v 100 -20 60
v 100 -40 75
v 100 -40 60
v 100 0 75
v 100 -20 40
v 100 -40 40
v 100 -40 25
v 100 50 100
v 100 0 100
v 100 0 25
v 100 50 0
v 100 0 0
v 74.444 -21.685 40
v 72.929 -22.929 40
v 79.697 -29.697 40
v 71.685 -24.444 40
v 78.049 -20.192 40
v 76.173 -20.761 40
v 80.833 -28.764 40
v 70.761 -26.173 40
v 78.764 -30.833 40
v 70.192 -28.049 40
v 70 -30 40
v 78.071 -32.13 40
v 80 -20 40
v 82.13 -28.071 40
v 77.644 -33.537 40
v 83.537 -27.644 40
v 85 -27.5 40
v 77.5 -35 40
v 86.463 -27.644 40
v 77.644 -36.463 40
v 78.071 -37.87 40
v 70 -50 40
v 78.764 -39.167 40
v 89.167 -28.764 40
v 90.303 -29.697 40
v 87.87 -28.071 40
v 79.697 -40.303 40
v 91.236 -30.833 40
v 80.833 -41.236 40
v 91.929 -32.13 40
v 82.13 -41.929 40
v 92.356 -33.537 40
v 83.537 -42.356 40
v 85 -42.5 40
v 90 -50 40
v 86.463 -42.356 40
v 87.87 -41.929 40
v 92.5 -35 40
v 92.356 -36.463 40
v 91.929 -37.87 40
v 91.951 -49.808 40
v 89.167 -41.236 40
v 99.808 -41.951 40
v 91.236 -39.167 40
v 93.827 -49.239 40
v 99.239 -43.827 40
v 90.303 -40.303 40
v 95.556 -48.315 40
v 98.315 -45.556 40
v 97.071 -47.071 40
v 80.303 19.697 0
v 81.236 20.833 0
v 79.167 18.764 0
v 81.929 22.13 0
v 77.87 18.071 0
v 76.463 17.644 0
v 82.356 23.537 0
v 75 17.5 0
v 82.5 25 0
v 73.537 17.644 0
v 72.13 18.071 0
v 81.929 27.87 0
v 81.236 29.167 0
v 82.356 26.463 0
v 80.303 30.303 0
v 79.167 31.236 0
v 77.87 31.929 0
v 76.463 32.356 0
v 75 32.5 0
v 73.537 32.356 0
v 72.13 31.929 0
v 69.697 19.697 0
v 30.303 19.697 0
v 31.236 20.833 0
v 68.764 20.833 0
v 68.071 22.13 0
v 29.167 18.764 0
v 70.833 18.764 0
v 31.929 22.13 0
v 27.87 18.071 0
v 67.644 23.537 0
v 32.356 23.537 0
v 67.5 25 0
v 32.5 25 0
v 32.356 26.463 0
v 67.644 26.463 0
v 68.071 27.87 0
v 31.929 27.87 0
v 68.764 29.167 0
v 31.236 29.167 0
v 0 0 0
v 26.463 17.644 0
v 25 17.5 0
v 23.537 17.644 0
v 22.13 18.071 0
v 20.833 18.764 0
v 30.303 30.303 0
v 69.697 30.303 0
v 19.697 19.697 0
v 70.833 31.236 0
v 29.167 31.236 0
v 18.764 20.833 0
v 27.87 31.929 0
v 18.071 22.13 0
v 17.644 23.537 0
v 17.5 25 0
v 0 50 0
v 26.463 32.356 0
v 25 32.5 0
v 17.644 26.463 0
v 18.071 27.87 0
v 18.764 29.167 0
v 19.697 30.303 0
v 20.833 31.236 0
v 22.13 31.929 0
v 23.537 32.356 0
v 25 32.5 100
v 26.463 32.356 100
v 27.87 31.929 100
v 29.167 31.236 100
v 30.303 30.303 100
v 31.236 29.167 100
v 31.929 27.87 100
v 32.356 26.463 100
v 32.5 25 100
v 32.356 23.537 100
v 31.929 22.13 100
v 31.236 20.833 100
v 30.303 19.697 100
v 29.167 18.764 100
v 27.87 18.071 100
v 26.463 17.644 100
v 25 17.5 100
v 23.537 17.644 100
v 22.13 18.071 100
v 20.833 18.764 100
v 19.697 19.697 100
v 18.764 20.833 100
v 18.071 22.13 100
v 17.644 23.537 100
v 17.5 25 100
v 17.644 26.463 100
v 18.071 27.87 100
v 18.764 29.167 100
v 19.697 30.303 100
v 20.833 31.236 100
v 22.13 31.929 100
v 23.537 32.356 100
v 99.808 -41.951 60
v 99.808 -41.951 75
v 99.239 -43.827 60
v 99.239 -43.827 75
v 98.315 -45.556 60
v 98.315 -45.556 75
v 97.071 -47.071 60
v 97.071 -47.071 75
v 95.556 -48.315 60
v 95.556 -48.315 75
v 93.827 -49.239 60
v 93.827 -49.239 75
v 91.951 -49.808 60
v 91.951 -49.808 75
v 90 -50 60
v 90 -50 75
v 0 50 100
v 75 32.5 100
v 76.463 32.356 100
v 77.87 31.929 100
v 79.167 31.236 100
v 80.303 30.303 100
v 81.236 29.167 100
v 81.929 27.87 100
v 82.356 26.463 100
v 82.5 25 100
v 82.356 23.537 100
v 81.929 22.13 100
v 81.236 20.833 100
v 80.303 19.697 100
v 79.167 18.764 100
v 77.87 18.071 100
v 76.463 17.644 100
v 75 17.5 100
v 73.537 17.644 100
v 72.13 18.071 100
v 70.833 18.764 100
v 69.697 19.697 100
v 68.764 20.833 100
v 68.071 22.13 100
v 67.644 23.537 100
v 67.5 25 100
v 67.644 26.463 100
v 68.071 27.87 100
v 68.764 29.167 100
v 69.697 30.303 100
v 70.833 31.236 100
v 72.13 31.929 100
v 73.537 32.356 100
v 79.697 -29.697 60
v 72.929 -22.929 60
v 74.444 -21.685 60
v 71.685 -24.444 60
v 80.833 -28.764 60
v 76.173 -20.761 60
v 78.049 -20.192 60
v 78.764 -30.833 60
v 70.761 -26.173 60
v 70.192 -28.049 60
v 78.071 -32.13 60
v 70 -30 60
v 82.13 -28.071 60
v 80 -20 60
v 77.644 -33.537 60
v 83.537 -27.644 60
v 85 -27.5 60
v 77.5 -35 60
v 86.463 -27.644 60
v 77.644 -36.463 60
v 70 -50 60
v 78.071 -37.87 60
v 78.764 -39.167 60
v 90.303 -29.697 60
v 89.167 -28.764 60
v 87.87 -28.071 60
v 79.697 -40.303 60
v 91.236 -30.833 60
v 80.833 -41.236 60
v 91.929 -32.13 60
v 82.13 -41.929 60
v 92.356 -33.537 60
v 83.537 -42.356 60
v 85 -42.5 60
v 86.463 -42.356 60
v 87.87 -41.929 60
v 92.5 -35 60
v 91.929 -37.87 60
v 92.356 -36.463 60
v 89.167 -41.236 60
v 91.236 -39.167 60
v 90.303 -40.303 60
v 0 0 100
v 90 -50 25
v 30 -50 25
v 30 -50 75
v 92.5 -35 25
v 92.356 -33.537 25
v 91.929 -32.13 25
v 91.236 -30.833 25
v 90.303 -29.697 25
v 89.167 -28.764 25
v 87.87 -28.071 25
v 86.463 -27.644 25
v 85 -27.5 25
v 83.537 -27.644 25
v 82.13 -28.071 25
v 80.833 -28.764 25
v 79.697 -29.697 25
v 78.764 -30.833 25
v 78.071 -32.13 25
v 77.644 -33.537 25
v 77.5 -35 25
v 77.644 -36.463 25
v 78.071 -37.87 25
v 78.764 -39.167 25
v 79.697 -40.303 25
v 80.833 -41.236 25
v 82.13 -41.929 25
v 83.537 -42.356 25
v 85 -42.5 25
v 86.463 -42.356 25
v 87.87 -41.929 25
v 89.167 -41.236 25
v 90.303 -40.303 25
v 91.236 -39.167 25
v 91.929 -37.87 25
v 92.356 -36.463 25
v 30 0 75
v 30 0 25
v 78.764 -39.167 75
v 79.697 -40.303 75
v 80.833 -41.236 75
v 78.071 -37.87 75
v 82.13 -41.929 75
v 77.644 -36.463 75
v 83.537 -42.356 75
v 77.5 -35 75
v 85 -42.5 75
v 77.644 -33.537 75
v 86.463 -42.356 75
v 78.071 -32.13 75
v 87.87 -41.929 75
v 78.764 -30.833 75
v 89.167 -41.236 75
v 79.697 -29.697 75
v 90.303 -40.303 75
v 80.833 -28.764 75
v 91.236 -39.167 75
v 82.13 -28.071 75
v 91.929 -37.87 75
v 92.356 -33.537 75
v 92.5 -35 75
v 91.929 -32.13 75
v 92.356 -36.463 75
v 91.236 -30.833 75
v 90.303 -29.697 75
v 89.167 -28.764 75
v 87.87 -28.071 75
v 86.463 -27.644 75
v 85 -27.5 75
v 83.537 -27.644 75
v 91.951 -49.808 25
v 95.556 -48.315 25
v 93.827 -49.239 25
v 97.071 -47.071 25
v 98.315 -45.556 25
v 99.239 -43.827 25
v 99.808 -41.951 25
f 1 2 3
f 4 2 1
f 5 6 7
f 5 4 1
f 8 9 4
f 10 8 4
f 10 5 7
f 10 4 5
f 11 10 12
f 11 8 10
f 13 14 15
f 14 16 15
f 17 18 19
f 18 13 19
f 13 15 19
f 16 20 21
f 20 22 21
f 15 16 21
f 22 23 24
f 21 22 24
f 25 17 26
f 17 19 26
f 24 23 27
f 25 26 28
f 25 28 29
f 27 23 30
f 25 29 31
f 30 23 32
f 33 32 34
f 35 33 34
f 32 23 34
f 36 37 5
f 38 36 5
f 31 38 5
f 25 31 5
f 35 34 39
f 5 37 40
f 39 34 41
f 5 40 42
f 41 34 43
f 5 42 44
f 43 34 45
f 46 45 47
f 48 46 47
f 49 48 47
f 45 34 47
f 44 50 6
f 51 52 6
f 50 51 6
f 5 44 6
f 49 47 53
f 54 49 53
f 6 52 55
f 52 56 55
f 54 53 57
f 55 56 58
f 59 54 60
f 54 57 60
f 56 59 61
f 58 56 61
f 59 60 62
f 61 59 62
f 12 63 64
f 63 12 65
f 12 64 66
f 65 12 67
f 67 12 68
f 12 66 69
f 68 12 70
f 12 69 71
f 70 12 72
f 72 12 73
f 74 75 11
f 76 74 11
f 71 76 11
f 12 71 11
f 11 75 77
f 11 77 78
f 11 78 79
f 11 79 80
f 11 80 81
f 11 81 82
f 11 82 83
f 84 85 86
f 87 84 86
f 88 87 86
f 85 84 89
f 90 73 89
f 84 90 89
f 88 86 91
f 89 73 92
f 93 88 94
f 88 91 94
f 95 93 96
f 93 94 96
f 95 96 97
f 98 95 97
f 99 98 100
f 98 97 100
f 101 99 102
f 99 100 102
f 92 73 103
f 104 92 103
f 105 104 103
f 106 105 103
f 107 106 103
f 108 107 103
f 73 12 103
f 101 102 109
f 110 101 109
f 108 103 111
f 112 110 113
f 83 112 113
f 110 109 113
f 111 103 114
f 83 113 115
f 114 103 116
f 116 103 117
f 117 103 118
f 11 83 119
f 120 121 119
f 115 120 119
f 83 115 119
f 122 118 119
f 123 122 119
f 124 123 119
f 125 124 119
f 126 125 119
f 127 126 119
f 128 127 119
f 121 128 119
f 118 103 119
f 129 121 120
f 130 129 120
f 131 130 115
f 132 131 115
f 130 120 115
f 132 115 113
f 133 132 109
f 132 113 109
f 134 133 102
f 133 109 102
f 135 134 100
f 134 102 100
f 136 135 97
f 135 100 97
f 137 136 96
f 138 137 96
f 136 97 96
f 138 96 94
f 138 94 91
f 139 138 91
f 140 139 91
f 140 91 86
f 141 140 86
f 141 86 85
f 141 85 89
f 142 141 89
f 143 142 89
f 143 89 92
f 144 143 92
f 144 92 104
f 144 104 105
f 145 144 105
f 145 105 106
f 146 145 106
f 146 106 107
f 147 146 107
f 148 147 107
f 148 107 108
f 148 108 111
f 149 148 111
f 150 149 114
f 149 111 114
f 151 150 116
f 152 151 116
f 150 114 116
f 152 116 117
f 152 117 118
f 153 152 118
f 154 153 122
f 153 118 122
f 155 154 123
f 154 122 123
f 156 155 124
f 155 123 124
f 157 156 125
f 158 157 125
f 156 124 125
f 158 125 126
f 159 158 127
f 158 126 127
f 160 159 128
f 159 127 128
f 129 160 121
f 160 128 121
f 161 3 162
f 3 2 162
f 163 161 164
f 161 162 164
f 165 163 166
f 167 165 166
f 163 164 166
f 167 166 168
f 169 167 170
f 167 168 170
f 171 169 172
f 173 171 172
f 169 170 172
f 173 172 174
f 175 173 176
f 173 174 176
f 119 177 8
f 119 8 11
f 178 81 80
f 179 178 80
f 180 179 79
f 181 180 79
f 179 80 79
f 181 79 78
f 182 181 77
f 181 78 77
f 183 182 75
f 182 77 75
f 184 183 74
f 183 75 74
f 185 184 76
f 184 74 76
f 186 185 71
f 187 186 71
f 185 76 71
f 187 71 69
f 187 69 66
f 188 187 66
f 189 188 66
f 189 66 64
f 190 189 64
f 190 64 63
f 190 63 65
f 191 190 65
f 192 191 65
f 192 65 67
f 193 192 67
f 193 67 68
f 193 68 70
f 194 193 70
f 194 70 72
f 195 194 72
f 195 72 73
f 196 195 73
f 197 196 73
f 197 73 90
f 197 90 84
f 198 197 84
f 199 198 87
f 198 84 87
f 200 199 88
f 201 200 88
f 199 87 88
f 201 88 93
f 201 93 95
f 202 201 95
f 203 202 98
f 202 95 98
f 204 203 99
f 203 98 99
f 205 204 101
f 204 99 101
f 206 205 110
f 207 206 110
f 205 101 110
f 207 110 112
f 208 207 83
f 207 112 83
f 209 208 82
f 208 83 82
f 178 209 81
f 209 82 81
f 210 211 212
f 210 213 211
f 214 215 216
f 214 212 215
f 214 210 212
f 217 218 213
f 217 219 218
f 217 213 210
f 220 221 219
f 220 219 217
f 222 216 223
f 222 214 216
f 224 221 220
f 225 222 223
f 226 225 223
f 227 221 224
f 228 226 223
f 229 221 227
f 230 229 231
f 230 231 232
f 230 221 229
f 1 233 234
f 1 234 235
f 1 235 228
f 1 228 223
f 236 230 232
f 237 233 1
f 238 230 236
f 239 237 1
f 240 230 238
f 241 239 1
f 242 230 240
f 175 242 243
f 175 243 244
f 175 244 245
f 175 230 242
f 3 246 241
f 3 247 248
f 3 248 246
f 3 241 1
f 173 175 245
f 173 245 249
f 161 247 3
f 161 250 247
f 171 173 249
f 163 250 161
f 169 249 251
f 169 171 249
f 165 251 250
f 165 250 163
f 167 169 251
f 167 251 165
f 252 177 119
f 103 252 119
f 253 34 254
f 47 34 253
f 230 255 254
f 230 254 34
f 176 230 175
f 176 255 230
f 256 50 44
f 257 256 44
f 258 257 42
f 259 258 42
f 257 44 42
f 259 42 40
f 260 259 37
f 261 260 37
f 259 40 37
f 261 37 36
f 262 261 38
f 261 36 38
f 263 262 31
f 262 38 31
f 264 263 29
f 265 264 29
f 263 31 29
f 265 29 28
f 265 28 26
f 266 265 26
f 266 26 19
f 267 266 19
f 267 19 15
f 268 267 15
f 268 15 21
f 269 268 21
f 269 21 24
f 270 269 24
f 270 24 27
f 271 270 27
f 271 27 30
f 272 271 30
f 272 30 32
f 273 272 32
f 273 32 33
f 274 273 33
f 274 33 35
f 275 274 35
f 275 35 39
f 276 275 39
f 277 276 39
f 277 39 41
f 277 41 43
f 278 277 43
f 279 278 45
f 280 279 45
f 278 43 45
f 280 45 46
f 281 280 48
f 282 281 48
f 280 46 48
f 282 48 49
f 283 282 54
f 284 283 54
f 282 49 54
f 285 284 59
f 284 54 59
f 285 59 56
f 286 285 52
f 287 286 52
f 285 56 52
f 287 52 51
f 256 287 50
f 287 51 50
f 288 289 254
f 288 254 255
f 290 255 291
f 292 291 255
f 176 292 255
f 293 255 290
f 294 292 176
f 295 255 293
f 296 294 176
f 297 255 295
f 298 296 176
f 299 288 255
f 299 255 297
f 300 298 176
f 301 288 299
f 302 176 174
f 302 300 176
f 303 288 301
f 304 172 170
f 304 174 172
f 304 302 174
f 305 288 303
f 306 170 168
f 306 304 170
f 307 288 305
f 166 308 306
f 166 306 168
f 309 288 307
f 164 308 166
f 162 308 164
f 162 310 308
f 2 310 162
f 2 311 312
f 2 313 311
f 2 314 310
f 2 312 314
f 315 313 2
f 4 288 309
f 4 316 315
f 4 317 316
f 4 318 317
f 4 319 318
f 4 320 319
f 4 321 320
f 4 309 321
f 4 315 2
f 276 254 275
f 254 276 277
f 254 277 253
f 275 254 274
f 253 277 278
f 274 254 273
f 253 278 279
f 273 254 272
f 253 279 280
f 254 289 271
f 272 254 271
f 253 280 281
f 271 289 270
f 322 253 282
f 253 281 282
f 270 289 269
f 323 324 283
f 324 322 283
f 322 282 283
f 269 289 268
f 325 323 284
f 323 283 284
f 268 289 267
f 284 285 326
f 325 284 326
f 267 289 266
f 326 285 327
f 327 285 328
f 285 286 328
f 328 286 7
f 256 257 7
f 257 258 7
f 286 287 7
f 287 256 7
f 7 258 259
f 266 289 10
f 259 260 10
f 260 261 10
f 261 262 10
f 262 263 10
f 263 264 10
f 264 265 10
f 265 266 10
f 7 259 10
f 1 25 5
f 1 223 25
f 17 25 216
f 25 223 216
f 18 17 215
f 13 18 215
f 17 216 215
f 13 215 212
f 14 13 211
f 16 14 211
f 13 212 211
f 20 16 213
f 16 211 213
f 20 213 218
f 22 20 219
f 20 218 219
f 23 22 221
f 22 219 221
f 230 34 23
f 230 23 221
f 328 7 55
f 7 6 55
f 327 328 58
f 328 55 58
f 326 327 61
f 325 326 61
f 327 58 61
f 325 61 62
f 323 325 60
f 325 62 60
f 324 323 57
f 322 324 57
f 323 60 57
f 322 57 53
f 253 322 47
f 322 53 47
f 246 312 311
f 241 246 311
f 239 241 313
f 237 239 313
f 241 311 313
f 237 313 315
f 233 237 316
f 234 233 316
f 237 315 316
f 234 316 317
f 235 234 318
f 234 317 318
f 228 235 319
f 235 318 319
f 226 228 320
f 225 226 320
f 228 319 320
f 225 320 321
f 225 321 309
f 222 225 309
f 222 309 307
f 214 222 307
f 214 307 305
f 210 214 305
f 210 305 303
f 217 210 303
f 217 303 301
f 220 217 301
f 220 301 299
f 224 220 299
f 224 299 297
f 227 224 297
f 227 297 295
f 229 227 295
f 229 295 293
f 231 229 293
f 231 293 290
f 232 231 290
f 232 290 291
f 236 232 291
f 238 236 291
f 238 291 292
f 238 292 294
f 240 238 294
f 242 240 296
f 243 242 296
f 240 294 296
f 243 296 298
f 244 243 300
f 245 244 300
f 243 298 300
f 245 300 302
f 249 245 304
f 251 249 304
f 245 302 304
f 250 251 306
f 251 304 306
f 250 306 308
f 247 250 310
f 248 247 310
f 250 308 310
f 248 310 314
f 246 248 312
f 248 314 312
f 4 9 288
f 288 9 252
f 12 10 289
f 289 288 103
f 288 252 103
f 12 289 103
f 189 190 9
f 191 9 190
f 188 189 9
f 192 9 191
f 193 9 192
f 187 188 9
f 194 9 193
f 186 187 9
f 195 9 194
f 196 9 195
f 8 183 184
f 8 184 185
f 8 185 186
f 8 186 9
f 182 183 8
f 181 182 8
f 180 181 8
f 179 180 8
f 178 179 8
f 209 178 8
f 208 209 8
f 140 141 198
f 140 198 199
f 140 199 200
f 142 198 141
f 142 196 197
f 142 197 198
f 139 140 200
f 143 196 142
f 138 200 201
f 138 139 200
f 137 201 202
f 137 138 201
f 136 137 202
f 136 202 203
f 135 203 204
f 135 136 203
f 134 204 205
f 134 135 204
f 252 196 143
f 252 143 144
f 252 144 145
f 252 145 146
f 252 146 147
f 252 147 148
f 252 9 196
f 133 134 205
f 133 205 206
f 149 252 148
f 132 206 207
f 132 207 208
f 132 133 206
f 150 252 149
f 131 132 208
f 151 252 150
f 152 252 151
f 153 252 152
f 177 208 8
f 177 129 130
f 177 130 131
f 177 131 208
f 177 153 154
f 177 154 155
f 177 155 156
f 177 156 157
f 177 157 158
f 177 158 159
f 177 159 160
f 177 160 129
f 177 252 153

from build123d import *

# Parameters (mm, degrees)
SKETCH1_W           = 100
SKETCH1_H           = 50
BOSS_EXTRUDE1_DEPTH = 100
SKETCH2_R           = 7.5
CUT_EXTRUDE1_DEPTH  = 151
SKETCH3_W           = 70
SKETCH3_H           = 50
BOSS_EXTRUDE2_DEPTH = 50
SKETCH4_R           = 7.5
CUT_EXTRUDE2_DEPTH  = 135.629120178
SKETCH5_W           = 30
SKETCH5_H           = 20
CUT_EXTRUDE3_DEPTH  = 30
FILLET1_R           = 10


with BuildPart() as part:
    # Sketch1 → Boss-Extrude1 (new body)
    with BuildSketch(Plane(origin=(0, 0, 0), x_dir=(0, 0, -1), z_dir=(1, 0, 0))):
        with Locations((-50, 25)):
            Rectangle(SKETCH1_W, SKETCH1_H)
    extrude(amount=BOSS_EXTRUDE1_DEPTH)

    # Sketch2 → Cut-Extrude1 (cut, through all)
    with BuildSketch(Plane(origin=(0, 0, 0), x_dir=(-1, 0, 0), z_dir=(0, 0, -1))):
        with Locations(Location((-75, 25, 0), (0, 0, 90))):
            Circle(SKETCH2_R)
        with Locations(Location((-25, 25, 0), (0, 0, 90))):
            Circle(SKETCH2_R)
    extrude(amount=-CUT_EXTRUDE1_DEPTH, mode=Mode.SUBTRACT)

    # Sketch3 → Boss-Extrude2 (add)
    with BuildSketch(Plane.XZ):
        with Locations((65, 50)):
            Rectangle(SKETCH3_W, SKETCH3_H)
    extrude(amount=BOSS_EXTRUDE2_DEPTH)

    # Sketch4 → Cut-Extrude2 (cut, through all)
    with BuildSketch(Plane.XY.offset(75)):
        with Locations((85, -35)):
            Circle(SKETCH4_R)
    extrude(amount=-CUT_EXTRUDE2_DEPTH, mode=Mode.SUBTRACT)

    # Sketch5 → Cut-Extrude3 (cut)
    with BuildSketch(Plane.XZ.offset(50)):
        with Locations((85, 50)):
            Rectangle(SKETCH5_W, SKETCH5_H)
    extrude(amount=-CUT_EXTRUDE3_DEPTH, mode=Mode.SUBTRACT)

    # Fillet1
    fillet1_edges = [part.edges().sort_by_distance(p)[0] for p in [
        (100, -50, 32.5),
        (100, -50, 67.5),
        (70, -20, 50),
    ]]
    fillet(fillet1_edges, radius=FILLET1_R)


solid = part.part
